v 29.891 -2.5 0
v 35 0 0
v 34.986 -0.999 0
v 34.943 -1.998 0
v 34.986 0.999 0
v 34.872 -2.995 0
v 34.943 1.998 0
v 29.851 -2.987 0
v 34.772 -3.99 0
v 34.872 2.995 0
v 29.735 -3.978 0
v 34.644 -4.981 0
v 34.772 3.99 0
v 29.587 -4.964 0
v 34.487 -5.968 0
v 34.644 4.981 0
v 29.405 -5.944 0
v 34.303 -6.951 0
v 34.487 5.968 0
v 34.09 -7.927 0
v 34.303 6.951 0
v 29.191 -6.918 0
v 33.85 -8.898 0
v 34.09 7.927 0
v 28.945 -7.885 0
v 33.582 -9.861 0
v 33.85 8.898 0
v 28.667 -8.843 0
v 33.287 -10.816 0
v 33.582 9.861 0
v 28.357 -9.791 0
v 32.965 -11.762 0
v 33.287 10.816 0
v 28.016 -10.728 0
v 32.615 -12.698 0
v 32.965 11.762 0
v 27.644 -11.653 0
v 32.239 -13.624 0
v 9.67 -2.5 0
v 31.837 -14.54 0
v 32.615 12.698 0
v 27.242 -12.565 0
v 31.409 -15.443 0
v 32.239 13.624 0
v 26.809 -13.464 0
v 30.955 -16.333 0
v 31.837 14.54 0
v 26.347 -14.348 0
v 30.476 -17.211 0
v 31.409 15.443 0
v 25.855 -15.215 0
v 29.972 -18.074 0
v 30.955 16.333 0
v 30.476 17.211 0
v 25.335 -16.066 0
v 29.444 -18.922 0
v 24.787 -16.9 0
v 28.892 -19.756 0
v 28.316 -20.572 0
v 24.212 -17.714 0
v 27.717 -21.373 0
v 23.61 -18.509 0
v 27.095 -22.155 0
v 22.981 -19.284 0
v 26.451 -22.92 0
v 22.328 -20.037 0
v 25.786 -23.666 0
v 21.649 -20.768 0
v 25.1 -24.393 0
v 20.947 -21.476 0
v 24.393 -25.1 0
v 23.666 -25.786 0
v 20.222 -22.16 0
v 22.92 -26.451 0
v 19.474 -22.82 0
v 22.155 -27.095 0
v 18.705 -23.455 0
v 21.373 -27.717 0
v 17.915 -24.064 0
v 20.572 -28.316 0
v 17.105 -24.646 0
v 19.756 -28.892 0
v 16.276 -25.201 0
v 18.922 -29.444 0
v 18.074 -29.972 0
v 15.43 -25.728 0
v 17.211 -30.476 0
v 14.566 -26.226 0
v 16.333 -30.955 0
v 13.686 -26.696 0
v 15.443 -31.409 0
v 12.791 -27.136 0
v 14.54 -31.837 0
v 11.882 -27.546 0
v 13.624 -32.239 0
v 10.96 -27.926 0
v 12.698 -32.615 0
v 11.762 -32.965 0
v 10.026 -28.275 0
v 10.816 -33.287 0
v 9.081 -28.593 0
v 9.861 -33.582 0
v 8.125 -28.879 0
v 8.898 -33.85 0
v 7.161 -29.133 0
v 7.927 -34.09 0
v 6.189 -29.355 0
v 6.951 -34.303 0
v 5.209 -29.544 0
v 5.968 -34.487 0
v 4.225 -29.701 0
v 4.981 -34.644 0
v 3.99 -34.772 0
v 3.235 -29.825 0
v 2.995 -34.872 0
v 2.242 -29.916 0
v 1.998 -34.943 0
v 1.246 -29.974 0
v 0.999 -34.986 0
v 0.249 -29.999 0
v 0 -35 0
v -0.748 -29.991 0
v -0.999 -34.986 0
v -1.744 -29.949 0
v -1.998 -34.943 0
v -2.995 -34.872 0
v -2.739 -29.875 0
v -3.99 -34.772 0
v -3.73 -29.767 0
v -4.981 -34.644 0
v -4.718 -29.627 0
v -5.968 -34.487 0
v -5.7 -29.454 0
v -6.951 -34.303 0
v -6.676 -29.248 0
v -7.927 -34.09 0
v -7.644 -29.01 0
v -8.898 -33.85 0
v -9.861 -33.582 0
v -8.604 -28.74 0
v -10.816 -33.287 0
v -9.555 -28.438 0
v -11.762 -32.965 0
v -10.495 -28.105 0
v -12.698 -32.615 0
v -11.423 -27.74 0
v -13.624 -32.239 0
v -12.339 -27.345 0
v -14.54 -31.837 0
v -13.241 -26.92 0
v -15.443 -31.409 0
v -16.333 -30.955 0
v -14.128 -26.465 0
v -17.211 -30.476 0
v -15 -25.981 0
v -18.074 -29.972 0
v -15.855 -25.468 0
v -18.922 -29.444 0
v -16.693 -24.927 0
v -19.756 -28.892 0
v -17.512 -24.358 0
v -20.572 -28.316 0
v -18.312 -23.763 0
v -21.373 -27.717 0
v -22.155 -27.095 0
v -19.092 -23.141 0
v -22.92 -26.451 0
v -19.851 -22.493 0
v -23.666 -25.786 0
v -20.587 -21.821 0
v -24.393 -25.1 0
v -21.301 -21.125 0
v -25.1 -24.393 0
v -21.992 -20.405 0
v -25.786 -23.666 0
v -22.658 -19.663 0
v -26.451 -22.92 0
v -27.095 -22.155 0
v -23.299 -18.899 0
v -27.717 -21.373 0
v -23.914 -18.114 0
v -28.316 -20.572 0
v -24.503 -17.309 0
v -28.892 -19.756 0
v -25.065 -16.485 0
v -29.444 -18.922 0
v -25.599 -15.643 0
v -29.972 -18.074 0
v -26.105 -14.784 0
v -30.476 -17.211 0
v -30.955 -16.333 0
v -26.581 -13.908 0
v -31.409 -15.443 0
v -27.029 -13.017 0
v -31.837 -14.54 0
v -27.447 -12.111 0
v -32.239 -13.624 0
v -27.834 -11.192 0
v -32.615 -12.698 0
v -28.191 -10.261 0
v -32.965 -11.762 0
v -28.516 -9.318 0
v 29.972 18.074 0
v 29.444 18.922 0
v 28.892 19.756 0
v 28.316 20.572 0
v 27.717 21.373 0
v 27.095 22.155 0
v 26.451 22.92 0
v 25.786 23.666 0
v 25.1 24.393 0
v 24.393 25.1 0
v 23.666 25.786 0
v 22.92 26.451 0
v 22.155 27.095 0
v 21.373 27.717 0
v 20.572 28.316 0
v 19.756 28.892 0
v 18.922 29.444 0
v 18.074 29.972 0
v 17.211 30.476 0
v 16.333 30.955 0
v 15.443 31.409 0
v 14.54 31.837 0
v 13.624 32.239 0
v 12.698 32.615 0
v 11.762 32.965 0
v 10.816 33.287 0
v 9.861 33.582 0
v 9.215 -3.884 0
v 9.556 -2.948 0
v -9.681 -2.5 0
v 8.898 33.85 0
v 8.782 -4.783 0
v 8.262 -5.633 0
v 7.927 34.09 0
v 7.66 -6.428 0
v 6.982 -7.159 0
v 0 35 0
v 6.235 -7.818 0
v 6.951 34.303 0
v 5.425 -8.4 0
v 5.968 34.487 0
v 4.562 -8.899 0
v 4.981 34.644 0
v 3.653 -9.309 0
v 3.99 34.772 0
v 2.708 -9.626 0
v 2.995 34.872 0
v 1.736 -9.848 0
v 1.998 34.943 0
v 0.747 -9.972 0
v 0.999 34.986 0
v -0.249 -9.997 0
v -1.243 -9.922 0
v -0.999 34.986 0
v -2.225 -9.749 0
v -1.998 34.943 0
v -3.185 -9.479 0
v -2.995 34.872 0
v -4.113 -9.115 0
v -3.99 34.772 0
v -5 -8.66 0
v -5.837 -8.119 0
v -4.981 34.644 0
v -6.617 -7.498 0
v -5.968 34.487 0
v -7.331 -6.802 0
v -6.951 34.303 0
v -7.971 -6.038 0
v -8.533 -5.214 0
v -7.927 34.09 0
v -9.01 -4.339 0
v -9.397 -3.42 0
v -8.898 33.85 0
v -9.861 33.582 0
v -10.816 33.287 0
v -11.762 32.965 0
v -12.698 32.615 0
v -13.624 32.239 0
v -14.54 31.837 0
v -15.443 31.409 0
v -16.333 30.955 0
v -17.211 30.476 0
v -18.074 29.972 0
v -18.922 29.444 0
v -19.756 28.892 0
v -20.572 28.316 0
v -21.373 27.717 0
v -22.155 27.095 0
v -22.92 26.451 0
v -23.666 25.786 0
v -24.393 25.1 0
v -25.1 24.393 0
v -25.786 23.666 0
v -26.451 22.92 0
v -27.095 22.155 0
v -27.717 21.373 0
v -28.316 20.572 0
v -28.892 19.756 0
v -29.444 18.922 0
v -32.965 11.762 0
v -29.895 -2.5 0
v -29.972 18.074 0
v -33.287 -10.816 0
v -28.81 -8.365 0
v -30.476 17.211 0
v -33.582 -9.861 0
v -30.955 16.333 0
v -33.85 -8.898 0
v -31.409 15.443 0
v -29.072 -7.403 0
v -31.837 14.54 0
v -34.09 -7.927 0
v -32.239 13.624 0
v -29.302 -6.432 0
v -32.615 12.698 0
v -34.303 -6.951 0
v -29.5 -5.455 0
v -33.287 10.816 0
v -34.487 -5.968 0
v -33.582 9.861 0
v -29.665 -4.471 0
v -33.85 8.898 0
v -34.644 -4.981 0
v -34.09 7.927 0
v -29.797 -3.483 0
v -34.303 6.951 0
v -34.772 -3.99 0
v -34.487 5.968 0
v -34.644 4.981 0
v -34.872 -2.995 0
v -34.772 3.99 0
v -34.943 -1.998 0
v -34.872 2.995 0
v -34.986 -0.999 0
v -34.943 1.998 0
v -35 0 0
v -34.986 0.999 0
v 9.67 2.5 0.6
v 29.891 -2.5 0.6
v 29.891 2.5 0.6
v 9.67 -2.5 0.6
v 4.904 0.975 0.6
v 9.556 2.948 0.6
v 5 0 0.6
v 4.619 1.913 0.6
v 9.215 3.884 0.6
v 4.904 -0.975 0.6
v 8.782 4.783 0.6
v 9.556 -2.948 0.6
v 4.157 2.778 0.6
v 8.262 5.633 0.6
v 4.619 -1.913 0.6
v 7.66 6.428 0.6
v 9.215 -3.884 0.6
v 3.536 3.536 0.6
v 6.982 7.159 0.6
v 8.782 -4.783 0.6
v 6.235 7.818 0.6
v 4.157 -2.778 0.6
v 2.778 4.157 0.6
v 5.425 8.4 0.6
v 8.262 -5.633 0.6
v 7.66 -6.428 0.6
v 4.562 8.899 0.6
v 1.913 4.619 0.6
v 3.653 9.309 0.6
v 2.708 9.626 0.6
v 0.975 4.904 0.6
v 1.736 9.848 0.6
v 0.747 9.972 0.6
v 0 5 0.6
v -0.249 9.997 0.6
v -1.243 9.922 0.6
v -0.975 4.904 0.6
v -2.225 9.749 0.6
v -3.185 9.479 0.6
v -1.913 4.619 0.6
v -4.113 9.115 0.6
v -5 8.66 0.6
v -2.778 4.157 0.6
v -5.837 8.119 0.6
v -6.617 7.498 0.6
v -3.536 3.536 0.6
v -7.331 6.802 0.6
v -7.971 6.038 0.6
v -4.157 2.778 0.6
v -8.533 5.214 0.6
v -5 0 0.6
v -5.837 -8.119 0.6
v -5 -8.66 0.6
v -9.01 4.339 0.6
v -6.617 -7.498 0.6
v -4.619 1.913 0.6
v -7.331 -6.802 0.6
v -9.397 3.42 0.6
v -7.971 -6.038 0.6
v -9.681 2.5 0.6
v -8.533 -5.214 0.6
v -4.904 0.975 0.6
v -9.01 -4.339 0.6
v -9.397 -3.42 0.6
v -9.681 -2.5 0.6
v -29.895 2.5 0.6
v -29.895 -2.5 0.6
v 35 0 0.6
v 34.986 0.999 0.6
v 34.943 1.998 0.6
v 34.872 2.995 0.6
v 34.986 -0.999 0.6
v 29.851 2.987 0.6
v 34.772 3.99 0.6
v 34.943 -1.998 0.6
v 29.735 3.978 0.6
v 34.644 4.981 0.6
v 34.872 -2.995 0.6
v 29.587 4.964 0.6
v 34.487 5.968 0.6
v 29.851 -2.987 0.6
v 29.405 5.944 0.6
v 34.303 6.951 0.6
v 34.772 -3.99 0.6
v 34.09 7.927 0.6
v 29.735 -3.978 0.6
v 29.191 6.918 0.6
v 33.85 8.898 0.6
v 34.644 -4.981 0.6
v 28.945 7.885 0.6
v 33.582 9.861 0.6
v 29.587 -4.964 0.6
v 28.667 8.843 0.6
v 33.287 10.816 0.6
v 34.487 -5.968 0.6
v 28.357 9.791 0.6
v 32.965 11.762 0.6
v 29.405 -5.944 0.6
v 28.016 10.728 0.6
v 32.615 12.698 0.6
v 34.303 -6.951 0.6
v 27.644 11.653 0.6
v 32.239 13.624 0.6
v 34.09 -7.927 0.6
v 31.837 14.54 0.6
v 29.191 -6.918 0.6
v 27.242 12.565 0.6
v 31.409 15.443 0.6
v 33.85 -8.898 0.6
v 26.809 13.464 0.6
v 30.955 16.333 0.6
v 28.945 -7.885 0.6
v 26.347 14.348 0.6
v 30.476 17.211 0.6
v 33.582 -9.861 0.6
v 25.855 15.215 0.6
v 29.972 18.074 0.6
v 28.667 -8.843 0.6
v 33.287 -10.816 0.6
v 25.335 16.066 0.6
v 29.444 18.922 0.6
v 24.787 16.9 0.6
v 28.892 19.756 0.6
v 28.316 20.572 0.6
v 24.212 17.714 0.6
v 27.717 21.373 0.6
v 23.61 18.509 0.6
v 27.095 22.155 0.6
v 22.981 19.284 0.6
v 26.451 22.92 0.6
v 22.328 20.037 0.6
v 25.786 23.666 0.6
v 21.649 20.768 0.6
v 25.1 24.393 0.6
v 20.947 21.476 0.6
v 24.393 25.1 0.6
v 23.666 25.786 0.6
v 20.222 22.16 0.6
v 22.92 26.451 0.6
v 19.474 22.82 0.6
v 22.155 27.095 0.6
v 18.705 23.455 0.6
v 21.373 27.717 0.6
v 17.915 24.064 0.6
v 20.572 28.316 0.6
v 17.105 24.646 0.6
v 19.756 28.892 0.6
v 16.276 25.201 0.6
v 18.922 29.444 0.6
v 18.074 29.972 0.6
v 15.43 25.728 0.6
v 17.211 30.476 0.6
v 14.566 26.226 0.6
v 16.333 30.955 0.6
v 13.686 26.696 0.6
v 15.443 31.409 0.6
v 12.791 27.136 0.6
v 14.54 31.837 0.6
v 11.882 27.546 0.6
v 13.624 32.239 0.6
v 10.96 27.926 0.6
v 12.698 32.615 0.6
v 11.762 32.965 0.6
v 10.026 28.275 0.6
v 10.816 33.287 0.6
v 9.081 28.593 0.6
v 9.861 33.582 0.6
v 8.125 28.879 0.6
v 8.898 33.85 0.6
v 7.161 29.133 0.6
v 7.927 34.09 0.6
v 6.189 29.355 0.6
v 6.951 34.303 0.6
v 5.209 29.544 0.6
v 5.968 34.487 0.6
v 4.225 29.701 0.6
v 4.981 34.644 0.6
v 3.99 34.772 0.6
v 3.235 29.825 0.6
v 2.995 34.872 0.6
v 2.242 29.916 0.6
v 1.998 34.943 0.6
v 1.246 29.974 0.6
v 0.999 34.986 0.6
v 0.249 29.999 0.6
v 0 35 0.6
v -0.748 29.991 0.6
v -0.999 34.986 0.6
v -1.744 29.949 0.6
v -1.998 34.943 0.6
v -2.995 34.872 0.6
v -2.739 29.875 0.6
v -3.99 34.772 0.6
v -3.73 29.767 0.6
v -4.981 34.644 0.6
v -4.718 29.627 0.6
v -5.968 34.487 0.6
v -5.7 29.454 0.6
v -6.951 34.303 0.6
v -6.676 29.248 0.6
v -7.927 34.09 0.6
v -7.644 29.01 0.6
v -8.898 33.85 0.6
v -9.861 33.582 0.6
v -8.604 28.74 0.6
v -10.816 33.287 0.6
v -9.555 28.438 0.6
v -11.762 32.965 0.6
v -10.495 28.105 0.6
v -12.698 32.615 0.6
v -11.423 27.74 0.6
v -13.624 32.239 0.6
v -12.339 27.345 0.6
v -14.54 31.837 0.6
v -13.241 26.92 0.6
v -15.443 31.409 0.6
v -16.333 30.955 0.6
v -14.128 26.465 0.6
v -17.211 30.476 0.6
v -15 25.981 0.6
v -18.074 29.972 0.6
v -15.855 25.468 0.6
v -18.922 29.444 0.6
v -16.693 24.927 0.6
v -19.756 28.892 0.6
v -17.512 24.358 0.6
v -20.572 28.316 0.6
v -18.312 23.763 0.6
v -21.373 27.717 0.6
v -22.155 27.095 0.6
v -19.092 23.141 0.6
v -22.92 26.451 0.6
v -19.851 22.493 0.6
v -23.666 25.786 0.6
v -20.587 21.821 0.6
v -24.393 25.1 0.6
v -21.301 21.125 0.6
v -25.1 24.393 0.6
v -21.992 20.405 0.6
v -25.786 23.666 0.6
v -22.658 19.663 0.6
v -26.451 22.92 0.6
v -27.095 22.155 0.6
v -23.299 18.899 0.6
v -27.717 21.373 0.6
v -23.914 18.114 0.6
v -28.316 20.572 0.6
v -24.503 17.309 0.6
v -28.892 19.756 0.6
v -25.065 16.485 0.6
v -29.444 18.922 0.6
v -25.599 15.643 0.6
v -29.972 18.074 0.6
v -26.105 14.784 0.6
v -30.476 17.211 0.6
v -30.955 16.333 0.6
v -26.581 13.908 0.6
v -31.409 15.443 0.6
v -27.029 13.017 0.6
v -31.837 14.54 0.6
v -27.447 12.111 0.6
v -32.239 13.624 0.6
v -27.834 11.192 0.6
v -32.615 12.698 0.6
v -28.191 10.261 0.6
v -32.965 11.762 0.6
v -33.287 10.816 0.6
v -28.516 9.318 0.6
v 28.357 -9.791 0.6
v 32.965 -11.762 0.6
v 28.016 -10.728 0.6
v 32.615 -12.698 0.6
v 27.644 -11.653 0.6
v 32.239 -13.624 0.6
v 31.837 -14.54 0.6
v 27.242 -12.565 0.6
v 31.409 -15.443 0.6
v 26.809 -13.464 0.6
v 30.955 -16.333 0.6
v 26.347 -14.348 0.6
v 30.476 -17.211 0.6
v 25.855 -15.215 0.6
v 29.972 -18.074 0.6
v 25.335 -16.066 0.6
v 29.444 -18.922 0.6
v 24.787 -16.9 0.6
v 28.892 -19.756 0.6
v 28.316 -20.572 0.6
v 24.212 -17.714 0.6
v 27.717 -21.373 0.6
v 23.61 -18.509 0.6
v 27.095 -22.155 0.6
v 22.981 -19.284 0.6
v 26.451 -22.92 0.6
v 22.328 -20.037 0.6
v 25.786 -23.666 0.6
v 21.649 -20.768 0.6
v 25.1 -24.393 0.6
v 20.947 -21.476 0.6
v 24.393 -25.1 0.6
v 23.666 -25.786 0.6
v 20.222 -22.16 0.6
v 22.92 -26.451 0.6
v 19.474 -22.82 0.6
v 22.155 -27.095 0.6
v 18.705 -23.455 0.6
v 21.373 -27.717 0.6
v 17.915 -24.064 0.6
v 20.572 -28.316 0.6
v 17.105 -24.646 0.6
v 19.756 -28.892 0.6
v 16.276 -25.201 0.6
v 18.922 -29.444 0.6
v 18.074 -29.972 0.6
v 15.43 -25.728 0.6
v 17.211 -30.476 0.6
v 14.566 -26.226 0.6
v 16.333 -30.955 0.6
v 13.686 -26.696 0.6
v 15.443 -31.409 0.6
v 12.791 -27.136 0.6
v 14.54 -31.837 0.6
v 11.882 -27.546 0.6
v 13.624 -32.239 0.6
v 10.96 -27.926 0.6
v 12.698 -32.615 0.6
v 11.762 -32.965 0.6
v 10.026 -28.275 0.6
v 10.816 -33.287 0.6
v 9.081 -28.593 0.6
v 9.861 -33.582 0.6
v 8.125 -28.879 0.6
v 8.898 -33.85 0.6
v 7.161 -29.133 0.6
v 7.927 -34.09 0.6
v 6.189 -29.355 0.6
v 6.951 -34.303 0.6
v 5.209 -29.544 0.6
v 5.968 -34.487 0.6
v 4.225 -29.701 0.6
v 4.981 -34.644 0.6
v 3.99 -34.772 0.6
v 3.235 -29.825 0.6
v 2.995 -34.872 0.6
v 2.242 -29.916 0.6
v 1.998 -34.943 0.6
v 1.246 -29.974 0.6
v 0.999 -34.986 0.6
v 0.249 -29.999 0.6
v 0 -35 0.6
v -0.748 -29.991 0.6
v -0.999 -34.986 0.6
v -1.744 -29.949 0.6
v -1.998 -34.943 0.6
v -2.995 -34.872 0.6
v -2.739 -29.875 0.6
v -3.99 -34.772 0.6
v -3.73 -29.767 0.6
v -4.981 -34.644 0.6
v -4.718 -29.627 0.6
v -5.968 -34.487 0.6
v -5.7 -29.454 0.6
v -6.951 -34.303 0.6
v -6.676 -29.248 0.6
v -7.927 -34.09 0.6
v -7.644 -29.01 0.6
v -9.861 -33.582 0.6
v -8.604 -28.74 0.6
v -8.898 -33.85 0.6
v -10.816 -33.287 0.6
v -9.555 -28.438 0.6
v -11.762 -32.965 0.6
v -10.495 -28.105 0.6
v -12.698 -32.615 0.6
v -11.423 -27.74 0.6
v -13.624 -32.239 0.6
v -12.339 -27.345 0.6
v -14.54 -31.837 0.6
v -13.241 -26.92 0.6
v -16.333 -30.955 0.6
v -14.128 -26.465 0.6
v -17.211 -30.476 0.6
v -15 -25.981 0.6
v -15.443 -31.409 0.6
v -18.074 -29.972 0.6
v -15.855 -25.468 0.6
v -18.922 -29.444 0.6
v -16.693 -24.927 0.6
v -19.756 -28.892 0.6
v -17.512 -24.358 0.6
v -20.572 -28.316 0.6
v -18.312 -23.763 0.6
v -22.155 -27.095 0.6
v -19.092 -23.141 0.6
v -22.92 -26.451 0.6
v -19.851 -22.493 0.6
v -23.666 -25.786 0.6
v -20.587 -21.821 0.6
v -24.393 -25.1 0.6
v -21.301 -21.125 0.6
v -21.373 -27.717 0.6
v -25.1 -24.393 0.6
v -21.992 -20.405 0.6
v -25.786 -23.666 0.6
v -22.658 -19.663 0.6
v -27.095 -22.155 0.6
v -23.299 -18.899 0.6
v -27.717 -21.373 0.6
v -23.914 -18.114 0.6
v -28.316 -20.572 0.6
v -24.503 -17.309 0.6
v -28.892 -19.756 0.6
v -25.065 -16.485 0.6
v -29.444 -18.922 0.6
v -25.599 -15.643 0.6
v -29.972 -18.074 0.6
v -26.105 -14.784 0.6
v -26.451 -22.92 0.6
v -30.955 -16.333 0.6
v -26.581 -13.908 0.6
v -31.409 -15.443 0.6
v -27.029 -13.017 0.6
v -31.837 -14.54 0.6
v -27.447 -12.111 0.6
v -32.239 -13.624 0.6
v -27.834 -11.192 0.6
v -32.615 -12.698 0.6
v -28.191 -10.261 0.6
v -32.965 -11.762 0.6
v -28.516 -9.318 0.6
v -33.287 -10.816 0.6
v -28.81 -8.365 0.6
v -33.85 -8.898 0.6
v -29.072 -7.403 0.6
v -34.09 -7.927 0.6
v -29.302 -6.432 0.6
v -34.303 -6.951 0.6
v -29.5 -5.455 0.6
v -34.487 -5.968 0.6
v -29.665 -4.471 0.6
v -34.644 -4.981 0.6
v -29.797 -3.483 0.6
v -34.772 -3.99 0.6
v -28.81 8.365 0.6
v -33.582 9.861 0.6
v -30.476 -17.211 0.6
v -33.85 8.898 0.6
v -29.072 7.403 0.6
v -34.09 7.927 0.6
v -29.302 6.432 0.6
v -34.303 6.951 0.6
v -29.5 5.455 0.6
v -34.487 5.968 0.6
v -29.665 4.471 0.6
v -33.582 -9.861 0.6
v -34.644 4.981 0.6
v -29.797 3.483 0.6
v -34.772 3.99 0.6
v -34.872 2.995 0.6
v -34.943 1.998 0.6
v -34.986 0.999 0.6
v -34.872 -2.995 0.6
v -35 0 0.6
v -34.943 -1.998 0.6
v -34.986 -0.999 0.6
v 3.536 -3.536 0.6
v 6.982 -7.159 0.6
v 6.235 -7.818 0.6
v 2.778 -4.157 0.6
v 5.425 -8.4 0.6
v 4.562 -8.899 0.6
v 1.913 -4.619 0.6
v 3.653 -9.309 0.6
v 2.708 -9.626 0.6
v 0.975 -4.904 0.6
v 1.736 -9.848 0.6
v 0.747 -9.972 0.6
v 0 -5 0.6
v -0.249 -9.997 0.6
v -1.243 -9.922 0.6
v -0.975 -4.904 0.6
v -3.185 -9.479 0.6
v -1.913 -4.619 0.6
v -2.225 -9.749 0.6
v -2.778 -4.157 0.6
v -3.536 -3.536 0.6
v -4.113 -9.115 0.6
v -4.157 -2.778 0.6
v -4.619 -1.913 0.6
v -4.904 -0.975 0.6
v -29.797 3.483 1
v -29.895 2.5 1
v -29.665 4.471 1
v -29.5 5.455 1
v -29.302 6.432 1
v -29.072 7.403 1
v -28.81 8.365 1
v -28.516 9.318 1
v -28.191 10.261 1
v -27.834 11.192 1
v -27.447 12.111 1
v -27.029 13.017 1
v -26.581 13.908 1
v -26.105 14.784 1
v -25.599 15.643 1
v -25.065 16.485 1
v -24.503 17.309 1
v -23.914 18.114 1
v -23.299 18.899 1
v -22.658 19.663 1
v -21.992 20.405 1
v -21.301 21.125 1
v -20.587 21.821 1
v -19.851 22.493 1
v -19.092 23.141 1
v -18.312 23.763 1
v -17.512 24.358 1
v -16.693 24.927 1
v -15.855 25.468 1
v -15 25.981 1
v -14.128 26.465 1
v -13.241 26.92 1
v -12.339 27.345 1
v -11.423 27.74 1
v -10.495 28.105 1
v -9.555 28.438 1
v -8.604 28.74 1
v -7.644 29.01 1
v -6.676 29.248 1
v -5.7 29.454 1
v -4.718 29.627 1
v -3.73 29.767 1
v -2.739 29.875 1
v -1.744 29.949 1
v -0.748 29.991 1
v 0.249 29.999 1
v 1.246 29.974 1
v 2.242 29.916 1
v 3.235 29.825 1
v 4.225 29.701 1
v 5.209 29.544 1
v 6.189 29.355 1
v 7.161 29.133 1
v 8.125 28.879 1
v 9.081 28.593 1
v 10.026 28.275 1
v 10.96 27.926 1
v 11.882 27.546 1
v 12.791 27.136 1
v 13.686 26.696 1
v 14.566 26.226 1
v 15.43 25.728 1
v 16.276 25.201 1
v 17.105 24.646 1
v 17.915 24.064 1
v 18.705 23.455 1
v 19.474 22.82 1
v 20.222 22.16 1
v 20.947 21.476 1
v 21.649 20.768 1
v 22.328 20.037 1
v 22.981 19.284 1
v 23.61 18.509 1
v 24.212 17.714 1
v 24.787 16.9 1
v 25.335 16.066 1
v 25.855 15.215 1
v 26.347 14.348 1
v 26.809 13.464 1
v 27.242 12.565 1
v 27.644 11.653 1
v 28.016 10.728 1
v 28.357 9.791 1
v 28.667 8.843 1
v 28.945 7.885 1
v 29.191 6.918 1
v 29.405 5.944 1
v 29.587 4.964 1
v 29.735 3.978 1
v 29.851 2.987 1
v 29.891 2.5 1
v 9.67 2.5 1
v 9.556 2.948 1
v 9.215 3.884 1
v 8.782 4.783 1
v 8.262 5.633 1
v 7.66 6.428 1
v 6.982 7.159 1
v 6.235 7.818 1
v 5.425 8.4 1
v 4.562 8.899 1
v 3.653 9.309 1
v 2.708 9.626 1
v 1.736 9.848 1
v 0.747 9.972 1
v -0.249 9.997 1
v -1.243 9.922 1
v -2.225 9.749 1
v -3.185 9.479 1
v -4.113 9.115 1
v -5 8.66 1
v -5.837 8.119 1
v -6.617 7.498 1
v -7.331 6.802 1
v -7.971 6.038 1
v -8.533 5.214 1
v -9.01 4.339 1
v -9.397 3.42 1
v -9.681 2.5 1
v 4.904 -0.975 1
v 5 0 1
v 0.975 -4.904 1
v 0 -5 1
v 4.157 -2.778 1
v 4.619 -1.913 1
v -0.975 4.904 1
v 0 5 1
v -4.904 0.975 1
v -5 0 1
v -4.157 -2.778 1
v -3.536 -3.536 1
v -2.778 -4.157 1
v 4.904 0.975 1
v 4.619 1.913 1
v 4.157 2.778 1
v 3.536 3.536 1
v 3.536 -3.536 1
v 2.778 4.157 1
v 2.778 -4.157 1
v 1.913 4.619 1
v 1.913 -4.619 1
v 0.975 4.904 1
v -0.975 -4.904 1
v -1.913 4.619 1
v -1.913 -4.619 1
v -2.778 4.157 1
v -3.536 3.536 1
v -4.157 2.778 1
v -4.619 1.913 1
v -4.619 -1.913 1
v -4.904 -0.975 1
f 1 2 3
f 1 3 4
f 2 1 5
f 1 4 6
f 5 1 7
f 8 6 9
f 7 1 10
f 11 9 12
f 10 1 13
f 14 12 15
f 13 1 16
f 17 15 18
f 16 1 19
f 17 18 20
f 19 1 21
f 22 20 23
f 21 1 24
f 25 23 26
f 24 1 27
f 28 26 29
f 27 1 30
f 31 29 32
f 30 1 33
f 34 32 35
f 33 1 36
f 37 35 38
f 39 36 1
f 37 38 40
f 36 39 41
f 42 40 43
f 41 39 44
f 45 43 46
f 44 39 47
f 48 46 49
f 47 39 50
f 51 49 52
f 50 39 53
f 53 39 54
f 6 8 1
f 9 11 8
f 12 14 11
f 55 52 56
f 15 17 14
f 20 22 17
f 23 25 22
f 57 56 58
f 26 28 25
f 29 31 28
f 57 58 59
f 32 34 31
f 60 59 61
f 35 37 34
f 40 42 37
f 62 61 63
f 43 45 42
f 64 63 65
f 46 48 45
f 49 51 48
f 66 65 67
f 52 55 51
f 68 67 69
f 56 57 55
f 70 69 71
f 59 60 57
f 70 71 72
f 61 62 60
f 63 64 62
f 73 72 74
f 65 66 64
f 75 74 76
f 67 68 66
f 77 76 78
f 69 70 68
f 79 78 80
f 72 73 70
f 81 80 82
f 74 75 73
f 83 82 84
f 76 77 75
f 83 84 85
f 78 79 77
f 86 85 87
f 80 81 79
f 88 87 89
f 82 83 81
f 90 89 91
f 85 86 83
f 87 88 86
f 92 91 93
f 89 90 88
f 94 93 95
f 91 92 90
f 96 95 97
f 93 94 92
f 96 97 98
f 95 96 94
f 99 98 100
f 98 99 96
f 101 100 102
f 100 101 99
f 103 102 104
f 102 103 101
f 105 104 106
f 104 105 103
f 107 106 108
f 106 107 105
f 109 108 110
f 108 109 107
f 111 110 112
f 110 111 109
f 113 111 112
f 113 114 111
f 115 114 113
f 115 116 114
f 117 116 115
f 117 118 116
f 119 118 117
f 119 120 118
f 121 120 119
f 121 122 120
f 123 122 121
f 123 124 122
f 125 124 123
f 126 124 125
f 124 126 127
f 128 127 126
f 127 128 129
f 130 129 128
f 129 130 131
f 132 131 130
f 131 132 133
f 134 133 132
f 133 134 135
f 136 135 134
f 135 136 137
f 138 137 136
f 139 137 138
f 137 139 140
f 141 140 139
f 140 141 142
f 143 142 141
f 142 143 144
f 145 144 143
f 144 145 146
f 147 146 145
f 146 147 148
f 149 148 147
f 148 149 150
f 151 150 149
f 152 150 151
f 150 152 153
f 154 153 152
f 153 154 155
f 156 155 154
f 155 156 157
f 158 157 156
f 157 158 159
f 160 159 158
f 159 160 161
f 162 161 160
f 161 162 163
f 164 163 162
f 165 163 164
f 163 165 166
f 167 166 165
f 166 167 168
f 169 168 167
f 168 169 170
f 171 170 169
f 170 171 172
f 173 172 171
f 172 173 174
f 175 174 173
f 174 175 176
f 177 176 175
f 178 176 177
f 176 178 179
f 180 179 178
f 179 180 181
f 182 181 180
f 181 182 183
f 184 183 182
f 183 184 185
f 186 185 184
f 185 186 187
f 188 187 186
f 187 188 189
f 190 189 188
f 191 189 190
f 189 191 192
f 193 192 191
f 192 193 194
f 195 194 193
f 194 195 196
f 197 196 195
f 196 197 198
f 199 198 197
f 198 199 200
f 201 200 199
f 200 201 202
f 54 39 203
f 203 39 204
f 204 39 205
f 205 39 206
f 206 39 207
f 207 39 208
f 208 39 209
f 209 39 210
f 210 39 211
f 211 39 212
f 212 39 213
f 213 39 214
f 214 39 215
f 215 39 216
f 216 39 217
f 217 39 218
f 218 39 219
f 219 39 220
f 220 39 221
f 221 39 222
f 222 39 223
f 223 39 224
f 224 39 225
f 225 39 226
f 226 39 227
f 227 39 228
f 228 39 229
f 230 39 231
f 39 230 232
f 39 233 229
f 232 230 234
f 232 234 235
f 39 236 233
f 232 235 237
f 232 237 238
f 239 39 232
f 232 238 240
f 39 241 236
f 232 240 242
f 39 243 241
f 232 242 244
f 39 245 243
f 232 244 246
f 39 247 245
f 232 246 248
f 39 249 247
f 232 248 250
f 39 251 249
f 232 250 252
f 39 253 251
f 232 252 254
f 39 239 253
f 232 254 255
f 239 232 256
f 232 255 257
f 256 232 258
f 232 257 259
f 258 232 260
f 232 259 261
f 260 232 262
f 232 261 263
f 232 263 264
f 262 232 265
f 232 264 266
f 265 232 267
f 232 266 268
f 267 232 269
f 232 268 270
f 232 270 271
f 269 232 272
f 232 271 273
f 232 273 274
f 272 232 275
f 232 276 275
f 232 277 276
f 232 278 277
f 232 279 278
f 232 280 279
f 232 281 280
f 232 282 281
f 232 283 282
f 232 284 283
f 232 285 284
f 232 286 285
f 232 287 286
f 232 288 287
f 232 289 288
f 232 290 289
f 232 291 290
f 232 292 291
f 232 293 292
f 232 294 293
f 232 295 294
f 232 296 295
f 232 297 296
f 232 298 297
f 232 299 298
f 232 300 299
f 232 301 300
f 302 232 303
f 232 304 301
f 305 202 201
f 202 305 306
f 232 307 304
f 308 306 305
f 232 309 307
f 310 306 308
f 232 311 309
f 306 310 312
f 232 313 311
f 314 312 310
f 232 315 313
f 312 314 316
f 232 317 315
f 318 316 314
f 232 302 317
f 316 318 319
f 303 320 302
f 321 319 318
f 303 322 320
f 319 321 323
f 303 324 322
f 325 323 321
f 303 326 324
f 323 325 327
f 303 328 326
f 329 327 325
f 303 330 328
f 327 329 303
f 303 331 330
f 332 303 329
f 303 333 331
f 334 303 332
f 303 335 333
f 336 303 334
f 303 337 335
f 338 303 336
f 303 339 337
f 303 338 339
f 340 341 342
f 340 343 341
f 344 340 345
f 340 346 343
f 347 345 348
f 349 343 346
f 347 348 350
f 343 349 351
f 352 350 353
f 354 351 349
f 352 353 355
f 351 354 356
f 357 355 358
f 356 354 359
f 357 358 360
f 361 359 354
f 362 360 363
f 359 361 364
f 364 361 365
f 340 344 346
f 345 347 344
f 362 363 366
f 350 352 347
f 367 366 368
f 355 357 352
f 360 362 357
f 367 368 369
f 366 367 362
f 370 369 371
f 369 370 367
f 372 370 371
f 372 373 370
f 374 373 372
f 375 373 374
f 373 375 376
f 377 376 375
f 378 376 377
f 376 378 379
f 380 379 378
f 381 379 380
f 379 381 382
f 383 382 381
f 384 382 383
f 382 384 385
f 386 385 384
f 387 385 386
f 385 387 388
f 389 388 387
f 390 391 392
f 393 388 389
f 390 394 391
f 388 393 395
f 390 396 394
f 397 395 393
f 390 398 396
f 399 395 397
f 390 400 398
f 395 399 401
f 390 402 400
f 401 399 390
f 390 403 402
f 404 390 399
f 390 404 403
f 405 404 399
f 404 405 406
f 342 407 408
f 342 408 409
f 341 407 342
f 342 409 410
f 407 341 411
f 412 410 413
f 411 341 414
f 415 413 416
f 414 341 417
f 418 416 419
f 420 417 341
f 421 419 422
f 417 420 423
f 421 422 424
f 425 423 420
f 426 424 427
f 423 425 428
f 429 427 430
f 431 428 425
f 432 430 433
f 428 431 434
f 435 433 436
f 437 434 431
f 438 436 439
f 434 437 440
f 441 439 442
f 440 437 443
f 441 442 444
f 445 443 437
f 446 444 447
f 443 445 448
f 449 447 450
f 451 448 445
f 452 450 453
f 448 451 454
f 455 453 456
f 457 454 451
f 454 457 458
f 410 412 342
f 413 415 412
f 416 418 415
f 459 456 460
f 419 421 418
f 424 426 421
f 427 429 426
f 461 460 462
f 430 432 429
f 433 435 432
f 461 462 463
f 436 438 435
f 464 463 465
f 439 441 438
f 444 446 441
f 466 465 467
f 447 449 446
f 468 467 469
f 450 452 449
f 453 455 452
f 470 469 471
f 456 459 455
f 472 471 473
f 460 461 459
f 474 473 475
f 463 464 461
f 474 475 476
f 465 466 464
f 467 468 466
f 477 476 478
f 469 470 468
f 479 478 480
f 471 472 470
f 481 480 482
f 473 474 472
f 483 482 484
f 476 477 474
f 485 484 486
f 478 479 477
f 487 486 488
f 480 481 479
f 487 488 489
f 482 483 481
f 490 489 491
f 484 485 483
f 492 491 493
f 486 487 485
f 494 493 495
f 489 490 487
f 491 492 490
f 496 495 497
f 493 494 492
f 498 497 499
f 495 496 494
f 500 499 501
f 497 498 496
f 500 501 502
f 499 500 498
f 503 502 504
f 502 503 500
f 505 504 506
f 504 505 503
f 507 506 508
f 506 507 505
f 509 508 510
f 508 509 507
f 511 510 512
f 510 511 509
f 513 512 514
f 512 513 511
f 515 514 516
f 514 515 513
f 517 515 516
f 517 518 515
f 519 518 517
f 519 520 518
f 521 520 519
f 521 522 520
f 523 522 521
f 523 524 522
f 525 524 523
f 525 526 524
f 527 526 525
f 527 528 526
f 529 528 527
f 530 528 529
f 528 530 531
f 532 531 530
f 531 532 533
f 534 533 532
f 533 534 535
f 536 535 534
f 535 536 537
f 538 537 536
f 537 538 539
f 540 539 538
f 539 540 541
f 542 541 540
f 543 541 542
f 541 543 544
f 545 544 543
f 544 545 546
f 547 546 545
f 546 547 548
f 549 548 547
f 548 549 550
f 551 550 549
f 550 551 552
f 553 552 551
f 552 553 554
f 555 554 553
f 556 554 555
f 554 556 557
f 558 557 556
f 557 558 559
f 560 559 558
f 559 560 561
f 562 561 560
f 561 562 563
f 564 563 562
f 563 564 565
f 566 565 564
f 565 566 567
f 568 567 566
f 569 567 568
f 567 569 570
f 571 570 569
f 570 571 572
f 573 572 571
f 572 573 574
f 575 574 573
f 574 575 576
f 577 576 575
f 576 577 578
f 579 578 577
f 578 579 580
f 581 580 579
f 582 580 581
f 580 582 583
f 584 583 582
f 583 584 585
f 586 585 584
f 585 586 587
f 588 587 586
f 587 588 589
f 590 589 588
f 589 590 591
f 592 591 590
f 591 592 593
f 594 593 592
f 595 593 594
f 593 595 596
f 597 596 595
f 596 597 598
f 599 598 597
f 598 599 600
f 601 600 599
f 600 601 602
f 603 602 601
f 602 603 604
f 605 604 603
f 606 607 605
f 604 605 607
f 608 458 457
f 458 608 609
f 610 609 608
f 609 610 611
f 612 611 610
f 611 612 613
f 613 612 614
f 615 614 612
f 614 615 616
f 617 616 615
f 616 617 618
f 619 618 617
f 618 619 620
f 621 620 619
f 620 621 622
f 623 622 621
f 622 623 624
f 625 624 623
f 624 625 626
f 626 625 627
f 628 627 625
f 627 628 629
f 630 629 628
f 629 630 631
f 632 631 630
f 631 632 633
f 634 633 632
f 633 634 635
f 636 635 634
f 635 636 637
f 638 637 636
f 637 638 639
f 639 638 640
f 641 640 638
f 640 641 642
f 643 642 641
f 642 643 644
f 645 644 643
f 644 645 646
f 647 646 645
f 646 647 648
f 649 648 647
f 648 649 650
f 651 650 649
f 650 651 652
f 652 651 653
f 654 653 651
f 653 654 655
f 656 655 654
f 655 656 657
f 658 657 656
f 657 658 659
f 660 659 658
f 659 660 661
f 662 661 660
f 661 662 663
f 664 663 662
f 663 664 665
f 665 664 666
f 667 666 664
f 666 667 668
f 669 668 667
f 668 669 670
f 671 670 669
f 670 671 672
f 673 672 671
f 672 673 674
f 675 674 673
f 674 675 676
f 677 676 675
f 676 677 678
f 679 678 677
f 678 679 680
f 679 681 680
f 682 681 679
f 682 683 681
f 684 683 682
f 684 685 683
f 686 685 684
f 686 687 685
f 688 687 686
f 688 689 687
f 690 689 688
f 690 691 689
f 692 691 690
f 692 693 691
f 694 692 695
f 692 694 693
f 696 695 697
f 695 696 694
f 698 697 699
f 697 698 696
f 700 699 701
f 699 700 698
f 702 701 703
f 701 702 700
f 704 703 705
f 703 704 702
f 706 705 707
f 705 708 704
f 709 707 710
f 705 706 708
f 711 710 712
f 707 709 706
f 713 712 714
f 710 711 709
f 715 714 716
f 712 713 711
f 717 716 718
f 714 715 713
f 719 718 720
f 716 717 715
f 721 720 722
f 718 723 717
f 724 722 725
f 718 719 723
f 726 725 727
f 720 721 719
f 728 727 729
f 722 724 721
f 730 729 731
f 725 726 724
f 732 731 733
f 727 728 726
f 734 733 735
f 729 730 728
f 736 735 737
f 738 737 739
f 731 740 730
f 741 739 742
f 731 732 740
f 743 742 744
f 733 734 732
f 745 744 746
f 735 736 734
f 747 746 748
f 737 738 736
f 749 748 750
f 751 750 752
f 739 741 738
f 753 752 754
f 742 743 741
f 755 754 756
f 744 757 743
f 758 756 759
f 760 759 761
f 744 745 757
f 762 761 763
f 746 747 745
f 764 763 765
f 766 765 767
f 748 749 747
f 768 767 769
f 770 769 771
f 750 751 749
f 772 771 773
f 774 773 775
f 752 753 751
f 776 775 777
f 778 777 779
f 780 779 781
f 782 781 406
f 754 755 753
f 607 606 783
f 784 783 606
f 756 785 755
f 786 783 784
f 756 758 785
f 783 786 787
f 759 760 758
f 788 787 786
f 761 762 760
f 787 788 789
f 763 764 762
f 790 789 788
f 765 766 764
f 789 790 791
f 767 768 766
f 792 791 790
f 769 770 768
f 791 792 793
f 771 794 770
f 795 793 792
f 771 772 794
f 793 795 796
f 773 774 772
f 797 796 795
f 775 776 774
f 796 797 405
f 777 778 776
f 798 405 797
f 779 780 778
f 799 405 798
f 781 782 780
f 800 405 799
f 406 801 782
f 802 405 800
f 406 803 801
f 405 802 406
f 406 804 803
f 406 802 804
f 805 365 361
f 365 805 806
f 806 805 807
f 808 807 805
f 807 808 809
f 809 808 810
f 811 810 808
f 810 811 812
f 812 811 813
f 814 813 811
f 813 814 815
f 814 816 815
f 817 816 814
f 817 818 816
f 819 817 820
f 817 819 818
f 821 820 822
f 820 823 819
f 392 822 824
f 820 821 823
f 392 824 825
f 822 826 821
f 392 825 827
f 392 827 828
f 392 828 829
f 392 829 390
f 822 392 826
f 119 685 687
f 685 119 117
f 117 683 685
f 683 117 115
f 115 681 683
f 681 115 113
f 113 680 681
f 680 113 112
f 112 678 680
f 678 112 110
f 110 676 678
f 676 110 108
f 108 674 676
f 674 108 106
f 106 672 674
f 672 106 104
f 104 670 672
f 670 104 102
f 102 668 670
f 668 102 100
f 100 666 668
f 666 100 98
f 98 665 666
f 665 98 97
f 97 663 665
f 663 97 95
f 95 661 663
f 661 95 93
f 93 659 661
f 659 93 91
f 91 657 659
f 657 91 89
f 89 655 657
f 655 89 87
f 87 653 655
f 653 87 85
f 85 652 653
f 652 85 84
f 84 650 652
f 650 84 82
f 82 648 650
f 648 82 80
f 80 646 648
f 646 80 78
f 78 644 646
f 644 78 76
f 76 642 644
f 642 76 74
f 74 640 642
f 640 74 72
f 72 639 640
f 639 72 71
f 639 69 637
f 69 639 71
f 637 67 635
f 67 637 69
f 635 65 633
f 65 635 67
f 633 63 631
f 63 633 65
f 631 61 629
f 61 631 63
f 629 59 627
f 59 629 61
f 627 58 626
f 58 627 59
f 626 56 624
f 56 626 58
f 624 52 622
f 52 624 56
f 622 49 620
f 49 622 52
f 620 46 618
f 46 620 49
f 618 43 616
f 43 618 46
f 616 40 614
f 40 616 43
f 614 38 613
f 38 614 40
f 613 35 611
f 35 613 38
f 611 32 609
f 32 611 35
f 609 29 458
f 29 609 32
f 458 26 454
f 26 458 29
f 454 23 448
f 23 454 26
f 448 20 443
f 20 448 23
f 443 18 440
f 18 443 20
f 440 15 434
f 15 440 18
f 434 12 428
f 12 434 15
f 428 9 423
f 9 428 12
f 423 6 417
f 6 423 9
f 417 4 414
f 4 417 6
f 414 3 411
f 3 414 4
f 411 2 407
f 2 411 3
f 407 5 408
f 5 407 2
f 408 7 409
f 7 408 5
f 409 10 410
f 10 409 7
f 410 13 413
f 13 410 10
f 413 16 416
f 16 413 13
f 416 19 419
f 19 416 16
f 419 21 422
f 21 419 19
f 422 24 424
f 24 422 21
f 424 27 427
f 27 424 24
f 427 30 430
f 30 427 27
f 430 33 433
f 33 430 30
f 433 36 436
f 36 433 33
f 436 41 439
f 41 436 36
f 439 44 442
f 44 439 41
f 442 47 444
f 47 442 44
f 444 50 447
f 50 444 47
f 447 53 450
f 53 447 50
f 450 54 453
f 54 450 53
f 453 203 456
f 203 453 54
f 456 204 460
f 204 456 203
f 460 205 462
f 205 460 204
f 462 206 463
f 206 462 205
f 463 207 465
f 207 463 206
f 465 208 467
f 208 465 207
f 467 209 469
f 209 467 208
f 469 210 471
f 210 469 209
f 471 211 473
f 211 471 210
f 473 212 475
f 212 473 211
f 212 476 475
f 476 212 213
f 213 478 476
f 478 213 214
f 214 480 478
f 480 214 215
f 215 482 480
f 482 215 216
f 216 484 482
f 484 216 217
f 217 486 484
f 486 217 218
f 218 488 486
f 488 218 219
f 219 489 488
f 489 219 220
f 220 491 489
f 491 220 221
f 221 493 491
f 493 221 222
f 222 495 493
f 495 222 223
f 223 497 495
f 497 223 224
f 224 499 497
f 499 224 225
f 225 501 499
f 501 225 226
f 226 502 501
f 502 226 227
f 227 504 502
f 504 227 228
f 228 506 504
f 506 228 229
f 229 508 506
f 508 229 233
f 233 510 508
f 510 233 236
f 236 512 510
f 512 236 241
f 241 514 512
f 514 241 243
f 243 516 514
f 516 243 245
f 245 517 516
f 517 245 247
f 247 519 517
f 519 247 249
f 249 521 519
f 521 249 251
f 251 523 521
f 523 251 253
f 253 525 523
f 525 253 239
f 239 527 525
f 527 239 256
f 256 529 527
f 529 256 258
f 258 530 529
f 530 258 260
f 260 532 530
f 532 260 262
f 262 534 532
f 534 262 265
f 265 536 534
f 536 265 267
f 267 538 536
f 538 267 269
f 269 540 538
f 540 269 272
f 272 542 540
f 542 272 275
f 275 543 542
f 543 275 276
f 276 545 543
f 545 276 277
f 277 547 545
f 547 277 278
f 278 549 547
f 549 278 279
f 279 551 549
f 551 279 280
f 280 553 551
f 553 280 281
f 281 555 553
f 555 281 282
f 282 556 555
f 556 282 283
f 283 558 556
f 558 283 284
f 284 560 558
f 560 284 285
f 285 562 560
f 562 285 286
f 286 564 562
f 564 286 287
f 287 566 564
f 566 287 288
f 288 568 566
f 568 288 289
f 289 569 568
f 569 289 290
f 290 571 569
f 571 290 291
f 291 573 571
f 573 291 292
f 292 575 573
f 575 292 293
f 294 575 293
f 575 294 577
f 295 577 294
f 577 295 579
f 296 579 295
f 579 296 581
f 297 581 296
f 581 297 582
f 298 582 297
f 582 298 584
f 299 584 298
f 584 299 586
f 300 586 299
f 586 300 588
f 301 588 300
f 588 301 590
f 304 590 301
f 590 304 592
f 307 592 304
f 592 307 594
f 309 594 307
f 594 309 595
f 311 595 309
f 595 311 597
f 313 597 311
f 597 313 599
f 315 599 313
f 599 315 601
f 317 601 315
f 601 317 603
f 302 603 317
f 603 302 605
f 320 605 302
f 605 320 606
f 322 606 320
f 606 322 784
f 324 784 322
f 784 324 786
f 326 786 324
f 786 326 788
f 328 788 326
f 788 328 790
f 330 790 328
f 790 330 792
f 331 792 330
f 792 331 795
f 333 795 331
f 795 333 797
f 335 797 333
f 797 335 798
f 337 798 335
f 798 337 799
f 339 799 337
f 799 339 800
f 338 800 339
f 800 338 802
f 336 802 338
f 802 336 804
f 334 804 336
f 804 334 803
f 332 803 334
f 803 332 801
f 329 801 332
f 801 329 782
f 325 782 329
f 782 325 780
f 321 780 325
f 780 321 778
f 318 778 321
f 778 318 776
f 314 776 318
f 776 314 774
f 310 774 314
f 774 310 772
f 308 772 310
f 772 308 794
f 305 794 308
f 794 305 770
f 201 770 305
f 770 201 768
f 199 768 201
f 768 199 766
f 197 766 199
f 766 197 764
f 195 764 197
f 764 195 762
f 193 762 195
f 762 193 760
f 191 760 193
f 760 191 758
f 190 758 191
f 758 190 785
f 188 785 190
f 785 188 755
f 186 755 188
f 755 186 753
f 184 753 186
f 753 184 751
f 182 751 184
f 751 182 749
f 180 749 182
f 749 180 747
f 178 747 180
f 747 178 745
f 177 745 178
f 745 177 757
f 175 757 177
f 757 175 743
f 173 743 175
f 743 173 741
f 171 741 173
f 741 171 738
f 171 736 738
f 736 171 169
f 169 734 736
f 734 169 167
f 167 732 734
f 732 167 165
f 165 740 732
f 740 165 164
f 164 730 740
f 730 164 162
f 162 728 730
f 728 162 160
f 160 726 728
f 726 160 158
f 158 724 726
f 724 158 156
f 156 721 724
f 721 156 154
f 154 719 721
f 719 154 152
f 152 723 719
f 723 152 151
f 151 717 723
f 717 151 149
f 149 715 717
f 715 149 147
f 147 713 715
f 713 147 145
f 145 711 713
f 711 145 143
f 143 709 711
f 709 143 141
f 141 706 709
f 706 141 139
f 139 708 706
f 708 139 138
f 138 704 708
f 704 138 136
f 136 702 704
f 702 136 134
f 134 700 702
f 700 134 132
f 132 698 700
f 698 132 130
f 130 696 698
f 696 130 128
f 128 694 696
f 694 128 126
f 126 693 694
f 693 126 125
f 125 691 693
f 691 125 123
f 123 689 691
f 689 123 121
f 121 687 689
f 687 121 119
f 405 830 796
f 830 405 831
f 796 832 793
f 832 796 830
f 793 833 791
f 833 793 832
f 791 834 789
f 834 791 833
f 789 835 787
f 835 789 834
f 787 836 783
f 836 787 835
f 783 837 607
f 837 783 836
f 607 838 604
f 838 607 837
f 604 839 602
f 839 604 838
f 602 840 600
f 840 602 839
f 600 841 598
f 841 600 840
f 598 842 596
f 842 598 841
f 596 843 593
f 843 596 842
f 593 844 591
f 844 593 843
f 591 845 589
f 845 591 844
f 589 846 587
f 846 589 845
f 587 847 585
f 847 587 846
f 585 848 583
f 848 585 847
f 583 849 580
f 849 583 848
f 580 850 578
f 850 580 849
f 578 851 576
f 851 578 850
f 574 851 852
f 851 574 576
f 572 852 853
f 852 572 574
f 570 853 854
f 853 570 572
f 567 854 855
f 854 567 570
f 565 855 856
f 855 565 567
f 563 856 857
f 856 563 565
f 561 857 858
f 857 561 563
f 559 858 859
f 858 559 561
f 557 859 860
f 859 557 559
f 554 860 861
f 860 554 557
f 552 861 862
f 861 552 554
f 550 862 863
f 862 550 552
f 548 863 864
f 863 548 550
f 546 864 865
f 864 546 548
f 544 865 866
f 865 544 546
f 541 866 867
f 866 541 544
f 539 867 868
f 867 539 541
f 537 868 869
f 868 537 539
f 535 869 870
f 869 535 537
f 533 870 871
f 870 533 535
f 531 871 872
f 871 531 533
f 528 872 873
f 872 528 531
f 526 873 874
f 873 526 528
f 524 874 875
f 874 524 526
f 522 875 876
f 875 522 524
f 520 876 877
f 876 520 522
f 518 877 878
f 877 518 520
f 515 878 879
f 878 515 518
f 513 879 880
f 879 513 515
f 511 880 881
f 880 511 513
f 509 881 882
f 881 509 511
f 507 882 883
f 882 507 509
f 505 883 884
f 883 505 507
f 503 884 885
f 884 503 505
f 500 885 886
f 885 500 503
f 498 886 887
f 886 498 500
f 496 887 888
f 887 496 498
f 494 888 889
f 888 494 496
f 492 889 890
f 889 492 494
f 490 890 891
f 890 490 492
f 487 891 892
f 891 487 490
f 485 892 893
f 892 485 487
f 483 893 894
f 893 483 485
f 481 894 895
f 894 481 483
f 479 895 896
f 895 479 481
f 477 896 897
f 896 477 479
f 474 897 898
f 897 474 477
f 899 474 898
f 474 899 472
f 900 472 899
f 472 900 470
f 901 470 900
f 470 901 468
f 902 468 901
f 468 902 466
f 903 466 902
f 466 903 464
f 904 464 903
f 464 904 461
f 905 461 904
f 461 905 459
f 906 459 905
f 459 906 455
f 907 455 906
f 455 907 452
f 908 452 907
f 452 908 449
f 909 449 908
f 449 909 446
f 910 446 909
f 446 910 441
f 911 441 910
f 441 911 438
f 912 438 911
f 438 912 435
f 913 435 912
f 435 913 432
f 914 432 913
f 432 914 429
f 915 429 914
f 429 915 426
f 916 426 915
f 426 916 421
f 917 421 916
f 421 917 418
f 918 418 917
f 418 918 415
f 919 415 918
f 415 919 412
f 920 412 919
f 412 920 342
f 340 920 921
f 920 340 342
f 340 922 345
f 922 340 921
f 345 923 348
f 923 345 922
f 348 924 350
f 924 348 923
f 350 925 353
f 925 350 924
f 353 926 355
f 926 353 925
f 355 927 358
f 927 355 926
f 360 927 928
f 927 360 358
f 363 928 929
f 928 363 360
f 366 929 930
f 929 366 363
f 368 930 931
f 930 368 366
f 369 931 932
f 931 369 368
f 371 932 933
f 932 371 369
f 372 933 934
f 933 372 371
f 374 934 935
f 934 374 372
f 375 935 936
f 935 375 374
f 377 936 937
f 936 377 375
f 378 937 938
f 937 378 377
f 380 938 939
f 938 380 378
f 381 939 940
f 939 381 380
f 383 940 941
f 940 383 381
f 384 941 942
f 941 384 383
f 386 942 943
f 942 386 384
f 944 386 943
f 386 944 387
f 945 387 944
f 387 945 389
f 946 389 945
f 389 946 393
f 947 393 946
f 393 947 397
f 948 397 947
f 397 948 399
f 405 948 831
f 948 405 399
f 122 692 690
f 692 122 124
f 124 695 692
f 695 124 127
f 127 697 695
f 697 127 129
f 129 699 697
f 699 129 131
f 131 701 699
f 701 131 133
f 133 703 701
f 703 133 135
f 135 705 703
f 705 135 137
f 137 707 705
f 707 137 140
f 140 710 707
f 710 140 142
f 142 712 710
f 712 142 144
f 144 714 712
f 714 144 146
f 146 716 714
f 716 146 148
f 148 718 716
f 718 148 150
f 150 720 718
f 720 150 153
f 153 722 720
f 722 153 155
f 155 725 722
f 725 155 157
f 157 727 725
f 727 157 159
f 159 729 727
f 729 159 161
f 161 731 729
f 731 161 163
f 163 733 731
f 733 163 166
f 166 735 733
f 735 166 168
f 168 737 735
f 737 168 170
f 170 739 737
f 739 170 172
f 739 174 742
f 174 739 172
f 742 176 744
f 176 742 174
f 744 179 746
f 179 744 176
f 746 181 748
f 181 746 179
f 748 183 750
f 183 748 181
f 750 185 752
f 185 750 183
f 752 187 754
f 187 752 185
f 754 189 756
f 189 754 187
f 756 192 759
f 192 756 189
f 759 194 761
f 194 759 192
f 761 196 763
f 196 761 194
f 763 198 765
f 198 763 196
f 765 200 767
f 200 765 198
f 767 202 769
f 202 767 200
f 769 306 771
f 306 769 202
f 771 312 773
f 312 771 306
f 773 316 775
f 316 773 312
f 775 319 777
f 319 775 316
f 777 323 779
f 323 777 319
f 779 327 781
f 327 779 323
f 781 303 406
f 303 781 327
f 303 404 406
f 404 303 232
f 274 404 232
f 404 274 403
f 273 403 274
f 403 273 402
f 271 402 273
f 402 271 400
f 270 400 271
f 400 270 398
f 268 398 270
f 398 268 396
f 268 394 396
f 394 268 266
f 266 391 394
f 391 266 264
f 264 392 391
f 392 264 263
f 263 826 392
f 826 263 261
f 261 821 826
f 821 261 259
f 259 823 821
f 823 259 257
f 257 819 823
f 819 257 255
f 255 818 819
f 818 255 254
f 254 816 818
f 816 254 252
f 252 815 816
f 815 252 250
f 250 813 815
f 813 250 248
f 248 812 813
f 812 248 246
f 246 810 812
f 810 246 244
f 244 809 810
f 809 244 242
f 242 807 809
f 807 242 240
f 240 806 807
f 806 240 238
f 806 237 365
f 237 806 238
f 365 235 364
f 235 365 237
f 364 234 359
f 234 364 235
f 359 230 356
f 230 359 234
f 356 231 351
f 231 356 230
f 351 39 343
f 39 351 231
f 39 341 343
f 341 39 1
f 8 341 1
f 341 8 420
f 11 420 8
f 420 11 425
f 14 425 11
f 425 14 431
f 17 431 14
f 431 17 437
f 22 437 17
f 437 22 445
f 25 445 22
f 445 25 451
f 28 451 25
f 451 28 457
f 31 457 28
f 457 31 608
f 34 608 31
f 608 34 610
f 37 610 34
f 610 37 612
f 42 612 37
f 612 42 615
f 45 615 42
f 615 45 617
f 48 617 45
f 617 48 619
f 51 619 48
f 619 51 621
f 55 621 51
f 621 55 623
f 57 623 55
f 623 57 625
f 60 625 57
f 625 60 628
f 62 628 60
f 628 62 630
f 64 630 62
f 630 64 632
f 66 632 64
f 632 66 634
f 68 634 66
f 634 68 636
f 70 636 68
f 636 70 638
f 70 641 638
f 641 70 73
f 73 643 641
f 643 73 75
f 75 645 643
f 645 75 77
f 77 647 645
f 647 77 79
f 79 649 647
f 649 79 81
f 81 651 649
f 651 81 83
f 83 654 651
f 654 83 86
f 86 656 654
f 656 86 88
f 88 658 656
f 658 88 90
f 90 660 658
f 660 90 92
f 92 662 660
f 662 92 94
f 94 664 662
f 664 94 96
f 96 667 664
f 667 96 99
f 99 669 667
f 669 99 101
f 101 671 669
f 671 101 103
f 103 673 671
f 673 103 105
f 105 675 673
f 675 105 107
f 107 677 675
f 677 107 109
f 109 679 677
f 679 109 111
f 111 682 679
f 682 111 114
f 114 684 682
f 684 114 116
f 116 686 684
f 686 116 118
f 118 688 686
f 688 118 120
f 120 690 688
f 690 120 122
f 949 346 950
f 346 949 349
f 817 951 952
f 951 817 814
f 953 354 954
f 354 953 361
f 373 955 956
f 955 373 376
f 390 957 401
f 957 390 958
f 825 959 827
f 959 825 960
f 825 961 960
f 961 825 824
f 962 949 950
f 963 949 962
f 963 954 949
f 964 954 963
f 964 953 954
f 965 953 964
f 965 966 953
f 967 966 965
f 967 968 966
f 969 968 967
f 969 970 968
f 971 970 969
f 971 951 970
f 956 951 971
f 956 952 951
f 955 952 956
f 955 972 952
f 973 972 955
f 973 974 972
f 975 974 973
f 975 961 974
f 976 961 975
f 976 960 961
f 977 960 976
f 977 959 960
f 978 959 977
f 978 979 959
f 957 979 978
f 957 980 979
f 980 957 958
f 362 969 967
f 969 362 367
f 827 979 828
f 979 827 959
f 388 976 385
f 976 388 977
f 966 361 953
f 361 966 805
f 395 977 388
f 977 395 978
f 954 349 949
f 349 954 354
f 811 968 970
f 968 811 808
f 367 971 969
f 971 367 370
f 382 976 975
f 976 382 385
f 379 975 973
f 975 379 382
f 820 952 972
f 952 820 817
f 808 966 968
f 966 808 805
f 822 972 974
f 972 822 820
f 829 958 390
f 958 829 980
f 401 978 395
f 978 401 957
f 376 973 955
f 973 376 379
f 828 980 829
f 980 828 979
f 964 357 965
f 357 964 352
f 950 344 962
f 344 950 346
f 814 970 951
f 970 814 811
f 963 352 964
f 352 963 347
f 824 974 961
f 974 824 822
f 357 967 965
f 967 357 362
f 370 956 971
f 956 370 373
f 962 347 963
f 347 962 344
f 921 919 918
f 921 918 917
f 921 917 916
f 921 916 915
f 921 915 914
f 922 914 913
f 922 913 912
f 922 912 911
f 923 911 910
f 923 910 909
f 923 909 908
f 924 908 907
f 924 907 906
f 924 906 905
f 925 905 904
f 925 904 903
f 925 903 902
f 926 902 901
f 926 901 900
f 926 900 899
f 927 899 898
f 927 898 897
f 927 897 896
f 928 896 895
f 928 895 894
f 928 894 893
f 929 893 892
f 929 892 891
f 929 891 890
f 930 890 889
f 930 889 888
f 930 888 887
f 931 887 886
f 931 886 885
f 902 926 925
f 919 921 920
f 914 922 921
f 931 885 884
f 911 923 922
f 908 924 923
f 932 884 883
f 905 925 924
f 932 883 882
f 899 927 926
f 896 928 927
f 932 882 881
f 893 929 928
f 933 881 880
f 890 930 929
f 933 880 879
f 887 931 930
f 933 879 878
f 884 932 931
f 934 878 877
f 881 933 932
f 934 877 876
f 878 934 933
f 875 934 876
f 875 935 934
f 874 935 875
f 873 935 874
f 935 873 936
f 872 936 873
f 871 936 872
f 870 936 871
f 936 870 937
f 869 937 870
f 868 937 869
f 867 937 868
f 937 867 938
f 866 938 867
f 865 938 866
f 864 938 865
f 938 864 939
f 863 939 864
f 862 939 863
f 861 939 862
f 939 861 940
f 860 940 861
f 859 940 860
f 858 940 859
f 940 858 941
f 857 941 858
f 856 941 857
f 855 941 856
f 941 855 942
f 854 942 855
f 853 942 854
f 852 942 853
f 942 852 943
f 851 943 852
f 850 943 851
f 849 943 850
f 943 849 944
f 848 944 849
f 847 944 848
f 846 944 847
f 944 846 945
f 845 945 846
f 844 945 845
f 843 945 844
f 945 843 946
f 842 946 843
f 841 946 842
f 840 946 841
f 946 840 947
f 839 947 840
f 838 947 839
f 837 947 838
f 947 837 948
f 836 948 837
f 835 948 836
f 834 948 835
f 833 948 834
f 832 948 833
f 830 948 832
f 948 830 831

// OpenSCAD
outer = 60;
inner = 10;
lines = 5;

thick = 1.0;
thin = 0.6;

$fa = 1;
$fs = 1;

linear_extrude(thin)
difference() {
    circle(d = outer + 2 * lines);

    difference() {
        circle(d = outer);
        
        square([2 * outer, lines], center = true);
        
        circle(d = inner + 2 * lines);
    }
}

color("red")
linear_extrude(thick)
circle(d = inner);

color("red")
linear_extrude(thick)
difference() {
    circle(d = outer);
    
    translate([0, -outer + lines / 2])
    square([2 * outer, 2 * outer], center = true);
    
    circle(d = inner + 2 * lines);
}


/*
linear_extrude(thin)
circle(d = outer + 2 * lines);

color("red")
linear_extrude(thick)
difference() {
    circle(d = outer);
    
    square([2 * outer, lines], center = true);
    
    circle(d = inner + 2 * lines);
}

color("red")
linear_extrude(thick)
circle(d = inner);
*/
